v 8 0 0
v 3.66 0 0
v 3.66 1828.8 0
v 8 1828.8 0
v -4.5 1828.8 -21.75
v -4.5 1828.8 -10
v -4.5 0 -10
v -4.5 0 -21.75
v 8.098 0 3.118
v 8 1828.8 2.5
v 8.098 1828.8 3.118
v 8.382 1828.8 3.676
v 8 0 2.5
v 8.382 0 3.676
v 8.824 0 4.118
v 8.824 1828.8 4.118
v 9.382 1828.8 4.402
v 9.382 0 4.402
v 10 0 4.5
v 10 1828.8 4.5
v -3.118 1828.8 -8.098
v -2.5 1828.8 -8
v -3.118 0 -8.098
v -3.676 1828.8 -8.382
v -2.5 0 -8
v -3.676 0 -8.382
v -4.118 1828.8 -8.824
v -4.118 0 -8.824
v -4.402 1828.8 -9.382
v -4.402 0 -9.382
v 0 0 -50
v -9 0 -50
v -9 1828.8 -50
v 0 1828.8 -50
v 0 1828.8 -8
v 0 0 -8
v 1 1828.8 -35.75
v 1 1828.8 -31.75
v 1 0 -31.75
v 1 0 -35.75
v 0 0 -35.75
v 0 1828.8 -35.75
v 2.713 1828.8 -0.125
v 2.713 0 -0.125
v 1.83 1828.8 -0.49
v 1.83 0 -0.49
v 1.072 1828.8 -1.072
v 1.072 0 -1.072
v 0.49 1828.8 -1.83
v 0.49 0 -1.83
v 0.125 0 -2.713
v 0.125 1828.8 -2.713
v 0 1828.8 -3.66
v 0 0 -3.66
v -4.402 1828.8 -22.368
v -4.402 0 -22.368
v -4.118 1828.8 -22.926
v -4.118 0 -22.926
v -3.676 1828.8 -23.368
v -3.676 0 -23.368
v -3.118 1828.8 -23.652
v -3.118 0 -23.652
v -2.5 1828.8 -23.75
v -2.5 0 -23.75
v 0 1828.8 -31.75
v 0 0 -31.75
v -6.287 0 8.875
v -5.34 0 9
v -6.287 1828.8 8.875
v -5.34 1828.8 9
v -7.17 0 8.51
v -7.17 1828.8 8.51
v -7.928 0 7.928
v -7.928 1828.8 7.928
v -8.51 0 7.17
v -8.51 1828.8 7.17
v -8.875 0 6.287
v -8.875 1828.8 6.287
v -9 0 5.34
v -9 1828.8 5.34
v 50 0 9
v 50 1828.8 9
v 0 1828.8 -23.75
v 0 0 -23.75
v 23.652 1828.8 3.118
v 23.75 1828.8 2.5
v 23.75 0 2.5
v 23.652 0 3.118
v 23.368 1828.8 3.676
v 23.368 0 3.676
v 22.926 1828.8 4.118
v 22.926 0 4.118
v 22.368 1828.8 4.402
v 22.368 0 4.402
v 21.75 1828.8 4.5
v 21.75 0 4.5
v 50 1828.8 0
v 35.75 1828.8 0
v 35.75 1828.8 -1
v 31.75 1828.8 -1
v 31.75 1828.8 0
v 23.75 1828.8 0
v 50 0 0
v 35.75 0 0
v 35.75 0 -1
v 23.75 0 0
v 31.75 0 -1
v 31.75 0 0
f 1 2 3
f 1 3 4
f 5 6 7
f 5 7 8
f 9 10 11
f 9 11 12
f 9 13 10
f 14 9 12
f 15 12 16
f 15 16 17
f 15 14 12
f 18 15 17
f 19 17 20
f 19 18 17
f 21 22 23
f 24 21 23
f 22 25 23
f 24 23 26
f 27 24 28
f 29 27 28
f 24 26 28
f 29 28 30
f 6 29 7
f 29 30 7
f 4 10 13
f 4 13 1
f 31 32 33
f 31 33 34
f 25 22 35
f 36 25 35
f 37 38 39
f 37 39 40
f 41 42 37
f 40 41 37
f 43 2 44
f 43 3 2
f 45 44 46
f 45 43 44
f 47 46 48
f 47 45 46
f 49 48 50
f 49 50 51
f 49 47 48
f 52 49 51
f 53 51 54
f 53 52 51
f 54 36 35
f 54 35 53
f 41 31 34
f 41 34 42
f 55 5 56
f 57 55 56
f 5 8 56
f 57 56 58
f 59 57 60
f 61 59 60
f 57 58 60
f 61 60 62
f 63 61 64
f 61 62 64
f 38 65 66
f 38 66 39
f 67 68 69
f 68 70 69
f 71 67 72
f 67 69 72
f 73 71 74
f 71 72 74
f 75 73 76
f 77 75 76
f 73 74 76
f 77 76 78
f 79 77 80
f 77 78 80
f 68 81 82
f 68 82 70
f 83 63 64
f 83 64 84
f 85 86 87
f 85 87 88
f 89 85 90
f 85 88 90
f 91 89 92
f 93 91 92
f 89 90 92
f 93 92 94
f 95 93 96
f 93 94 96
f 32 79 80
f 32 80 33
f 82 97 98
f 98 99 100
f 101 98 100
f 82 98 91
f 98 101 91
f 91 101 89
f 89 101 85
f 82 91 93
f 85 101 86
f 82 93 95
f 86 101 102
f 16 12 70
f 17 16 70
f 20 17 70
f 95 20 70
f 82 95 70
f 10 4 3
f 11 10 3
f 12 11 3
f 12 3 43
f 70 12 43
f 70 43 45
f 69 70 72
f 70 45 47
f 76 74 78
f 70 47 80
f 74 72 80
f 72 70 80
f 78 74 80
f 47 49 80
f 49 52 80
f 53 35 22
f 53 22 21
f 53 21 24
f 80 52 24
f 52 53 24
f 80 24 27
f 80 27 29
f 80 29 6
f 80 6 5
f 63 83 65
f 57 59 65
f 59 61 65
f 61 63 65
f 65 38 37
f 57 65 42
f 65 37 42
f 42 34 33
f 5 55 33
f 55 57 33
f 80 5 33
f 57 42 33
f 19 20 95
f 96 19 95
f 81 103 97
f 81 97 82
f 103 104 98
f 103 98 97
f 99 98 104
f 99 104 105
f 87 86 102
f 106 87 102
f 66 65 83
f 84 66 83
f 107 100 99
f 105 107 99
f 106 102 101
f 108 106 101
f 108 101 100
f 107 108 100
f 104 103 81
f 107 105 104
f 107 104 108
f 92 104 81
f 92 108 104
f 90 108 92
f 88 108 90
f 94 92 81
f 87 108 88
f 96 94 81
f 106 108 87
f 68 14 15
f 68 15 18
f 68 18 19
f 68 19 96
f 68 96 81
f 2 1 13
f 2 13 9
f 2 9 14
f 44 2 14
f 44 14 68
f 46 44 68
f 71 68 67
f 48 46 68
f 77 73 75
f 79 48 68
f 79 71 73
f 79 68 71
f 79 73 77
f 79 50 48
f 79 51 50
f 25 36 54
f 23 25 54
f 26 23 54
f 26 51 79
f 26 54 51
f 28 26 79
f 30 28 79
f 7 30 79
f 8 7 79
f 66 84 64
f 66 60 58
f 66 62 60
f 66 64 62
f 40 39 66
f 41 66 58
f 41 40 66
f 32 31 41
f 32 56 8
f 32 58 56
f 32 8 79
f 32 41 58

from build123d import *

# Parameters (mm, degrees)
BOSS_EXTRUDE1_DEPTH = 1828.8
SKETCH6_W           = 1
SKETCH6_H           = 4
BOSS_EXTRUDE2_DEPTH = 1828.8
SKETCH7_W           = 4
SKETCH7_H           = 1
BOSS_EXTRUDE3_DEPTH = 1828.8
SKETCH8_W           = 15.75
SKETCH8_H           = 4.5
CUT_EXTRUDE3_DEPTH  = 1829.8
SKETCH9_W           = 4.5
SKETCH9_H           = 15.75
CUT_EXTRUDE4_DEPTH  = 1829.8
FILLET4_R           = 2
FILLET2_R           = 3.66
FILLET3_R           = 3.66


with BuildPart() as part:
    # Sketch2 → Boss-Extrude1 (new body)
    with BuildSketch(Plane(origin=(0, 0, 0), x_dir=(1, 0, 0), z_dir=(0, 1, 0))):
        Polygon((0, 0), (50, 0), (50, -9), (-9, -9), (-9, 50), (0, 50), align=None)
    extrude(amount=BOSS_EXTRUDE1_DEPTH)

    # Sketch6 → Boss-Extrude2 (add, through all)
    with BuildSketch(Plane(origin=(0, 1828.8, 0), x_dir=(1, 0, 0), z_dir=(0, 1, 0))):
        with Locations((0.5, 33.75)):
            Rectangle(SKETCH6_W, SKETCH6_H)
    extrude(amount=-BOSS_EXTRUDE2_DEPTH)

    # Sketch7 → Boss-Extrude3 (add, through all)
    with BuildSketch(Plane(origin=(0, 1828.8, 0), x_dir=(1, 0, 0), z_dir=(0, 1, 0))):
        with Locations((33.75, 0.5)):
            Rectangle(SKETCH7_W, SKETCH7_H)
    extrude(amount=-BOSS_EXTRUDE3_DEPTH)

    # Sketch8 → Cut-Extrude3 (cut, through all)
    with BuildSketch(Plane(origin=(0, 1828.8, 0), x_dir=(1, 0, 0), z_dir=(0, 1, 0))):
        with Locations((15.875, -2.25)):
            Rectangle(SKETCH8_W, SKETCH8_H)
    extrude(amount=-CUT_EXTRUDE3_DEPTH, mode=Mode.SUBTRACT)

    # Sketch9 → Cut-Extrude4 (cut, through all)
    with BuildSketch(Plane(origin=(0, 1828.8, 0), x_dir=(1, 0, 0), z_dir=(0, 1, 0))):
        with Locations((-2.25, 15.875)):
            Rectangle(SKETCH9_W, SKETCH9_H)
    extrude(amount=-CUT_EXTRUDE4_DEPTH, mode=Mode.SUBTRACT)

    # Fillet4
    fillet4_edges = [part.edges().sort_by_distance(p)[0] for p in [
        (8, 914.4, 4.5),
        (23.75, 914.4, 4.5),
        (-4.5, 914.4, -8),
        (-4.5, 914.4, -23.75),
    ]]
    fillet(fillet4_edges, radius=FILLET4_R)

    # Fillet2
    fillet2_edges = [part.edges().sort_by_distance(p)[0] for p in [
        (0, 914.4, 0),
    ]]
    fillet(fillet2_edges, radius=FILLET2_R)

    # Fillet3
    fillet3_edges = [part.edges().sort_by_distance(p)[0] for p in [
        (-9, 914.4, 9),
    ]]
    fillet(fillet3_edges, radius=FILLET3_R)


solid = part.part
